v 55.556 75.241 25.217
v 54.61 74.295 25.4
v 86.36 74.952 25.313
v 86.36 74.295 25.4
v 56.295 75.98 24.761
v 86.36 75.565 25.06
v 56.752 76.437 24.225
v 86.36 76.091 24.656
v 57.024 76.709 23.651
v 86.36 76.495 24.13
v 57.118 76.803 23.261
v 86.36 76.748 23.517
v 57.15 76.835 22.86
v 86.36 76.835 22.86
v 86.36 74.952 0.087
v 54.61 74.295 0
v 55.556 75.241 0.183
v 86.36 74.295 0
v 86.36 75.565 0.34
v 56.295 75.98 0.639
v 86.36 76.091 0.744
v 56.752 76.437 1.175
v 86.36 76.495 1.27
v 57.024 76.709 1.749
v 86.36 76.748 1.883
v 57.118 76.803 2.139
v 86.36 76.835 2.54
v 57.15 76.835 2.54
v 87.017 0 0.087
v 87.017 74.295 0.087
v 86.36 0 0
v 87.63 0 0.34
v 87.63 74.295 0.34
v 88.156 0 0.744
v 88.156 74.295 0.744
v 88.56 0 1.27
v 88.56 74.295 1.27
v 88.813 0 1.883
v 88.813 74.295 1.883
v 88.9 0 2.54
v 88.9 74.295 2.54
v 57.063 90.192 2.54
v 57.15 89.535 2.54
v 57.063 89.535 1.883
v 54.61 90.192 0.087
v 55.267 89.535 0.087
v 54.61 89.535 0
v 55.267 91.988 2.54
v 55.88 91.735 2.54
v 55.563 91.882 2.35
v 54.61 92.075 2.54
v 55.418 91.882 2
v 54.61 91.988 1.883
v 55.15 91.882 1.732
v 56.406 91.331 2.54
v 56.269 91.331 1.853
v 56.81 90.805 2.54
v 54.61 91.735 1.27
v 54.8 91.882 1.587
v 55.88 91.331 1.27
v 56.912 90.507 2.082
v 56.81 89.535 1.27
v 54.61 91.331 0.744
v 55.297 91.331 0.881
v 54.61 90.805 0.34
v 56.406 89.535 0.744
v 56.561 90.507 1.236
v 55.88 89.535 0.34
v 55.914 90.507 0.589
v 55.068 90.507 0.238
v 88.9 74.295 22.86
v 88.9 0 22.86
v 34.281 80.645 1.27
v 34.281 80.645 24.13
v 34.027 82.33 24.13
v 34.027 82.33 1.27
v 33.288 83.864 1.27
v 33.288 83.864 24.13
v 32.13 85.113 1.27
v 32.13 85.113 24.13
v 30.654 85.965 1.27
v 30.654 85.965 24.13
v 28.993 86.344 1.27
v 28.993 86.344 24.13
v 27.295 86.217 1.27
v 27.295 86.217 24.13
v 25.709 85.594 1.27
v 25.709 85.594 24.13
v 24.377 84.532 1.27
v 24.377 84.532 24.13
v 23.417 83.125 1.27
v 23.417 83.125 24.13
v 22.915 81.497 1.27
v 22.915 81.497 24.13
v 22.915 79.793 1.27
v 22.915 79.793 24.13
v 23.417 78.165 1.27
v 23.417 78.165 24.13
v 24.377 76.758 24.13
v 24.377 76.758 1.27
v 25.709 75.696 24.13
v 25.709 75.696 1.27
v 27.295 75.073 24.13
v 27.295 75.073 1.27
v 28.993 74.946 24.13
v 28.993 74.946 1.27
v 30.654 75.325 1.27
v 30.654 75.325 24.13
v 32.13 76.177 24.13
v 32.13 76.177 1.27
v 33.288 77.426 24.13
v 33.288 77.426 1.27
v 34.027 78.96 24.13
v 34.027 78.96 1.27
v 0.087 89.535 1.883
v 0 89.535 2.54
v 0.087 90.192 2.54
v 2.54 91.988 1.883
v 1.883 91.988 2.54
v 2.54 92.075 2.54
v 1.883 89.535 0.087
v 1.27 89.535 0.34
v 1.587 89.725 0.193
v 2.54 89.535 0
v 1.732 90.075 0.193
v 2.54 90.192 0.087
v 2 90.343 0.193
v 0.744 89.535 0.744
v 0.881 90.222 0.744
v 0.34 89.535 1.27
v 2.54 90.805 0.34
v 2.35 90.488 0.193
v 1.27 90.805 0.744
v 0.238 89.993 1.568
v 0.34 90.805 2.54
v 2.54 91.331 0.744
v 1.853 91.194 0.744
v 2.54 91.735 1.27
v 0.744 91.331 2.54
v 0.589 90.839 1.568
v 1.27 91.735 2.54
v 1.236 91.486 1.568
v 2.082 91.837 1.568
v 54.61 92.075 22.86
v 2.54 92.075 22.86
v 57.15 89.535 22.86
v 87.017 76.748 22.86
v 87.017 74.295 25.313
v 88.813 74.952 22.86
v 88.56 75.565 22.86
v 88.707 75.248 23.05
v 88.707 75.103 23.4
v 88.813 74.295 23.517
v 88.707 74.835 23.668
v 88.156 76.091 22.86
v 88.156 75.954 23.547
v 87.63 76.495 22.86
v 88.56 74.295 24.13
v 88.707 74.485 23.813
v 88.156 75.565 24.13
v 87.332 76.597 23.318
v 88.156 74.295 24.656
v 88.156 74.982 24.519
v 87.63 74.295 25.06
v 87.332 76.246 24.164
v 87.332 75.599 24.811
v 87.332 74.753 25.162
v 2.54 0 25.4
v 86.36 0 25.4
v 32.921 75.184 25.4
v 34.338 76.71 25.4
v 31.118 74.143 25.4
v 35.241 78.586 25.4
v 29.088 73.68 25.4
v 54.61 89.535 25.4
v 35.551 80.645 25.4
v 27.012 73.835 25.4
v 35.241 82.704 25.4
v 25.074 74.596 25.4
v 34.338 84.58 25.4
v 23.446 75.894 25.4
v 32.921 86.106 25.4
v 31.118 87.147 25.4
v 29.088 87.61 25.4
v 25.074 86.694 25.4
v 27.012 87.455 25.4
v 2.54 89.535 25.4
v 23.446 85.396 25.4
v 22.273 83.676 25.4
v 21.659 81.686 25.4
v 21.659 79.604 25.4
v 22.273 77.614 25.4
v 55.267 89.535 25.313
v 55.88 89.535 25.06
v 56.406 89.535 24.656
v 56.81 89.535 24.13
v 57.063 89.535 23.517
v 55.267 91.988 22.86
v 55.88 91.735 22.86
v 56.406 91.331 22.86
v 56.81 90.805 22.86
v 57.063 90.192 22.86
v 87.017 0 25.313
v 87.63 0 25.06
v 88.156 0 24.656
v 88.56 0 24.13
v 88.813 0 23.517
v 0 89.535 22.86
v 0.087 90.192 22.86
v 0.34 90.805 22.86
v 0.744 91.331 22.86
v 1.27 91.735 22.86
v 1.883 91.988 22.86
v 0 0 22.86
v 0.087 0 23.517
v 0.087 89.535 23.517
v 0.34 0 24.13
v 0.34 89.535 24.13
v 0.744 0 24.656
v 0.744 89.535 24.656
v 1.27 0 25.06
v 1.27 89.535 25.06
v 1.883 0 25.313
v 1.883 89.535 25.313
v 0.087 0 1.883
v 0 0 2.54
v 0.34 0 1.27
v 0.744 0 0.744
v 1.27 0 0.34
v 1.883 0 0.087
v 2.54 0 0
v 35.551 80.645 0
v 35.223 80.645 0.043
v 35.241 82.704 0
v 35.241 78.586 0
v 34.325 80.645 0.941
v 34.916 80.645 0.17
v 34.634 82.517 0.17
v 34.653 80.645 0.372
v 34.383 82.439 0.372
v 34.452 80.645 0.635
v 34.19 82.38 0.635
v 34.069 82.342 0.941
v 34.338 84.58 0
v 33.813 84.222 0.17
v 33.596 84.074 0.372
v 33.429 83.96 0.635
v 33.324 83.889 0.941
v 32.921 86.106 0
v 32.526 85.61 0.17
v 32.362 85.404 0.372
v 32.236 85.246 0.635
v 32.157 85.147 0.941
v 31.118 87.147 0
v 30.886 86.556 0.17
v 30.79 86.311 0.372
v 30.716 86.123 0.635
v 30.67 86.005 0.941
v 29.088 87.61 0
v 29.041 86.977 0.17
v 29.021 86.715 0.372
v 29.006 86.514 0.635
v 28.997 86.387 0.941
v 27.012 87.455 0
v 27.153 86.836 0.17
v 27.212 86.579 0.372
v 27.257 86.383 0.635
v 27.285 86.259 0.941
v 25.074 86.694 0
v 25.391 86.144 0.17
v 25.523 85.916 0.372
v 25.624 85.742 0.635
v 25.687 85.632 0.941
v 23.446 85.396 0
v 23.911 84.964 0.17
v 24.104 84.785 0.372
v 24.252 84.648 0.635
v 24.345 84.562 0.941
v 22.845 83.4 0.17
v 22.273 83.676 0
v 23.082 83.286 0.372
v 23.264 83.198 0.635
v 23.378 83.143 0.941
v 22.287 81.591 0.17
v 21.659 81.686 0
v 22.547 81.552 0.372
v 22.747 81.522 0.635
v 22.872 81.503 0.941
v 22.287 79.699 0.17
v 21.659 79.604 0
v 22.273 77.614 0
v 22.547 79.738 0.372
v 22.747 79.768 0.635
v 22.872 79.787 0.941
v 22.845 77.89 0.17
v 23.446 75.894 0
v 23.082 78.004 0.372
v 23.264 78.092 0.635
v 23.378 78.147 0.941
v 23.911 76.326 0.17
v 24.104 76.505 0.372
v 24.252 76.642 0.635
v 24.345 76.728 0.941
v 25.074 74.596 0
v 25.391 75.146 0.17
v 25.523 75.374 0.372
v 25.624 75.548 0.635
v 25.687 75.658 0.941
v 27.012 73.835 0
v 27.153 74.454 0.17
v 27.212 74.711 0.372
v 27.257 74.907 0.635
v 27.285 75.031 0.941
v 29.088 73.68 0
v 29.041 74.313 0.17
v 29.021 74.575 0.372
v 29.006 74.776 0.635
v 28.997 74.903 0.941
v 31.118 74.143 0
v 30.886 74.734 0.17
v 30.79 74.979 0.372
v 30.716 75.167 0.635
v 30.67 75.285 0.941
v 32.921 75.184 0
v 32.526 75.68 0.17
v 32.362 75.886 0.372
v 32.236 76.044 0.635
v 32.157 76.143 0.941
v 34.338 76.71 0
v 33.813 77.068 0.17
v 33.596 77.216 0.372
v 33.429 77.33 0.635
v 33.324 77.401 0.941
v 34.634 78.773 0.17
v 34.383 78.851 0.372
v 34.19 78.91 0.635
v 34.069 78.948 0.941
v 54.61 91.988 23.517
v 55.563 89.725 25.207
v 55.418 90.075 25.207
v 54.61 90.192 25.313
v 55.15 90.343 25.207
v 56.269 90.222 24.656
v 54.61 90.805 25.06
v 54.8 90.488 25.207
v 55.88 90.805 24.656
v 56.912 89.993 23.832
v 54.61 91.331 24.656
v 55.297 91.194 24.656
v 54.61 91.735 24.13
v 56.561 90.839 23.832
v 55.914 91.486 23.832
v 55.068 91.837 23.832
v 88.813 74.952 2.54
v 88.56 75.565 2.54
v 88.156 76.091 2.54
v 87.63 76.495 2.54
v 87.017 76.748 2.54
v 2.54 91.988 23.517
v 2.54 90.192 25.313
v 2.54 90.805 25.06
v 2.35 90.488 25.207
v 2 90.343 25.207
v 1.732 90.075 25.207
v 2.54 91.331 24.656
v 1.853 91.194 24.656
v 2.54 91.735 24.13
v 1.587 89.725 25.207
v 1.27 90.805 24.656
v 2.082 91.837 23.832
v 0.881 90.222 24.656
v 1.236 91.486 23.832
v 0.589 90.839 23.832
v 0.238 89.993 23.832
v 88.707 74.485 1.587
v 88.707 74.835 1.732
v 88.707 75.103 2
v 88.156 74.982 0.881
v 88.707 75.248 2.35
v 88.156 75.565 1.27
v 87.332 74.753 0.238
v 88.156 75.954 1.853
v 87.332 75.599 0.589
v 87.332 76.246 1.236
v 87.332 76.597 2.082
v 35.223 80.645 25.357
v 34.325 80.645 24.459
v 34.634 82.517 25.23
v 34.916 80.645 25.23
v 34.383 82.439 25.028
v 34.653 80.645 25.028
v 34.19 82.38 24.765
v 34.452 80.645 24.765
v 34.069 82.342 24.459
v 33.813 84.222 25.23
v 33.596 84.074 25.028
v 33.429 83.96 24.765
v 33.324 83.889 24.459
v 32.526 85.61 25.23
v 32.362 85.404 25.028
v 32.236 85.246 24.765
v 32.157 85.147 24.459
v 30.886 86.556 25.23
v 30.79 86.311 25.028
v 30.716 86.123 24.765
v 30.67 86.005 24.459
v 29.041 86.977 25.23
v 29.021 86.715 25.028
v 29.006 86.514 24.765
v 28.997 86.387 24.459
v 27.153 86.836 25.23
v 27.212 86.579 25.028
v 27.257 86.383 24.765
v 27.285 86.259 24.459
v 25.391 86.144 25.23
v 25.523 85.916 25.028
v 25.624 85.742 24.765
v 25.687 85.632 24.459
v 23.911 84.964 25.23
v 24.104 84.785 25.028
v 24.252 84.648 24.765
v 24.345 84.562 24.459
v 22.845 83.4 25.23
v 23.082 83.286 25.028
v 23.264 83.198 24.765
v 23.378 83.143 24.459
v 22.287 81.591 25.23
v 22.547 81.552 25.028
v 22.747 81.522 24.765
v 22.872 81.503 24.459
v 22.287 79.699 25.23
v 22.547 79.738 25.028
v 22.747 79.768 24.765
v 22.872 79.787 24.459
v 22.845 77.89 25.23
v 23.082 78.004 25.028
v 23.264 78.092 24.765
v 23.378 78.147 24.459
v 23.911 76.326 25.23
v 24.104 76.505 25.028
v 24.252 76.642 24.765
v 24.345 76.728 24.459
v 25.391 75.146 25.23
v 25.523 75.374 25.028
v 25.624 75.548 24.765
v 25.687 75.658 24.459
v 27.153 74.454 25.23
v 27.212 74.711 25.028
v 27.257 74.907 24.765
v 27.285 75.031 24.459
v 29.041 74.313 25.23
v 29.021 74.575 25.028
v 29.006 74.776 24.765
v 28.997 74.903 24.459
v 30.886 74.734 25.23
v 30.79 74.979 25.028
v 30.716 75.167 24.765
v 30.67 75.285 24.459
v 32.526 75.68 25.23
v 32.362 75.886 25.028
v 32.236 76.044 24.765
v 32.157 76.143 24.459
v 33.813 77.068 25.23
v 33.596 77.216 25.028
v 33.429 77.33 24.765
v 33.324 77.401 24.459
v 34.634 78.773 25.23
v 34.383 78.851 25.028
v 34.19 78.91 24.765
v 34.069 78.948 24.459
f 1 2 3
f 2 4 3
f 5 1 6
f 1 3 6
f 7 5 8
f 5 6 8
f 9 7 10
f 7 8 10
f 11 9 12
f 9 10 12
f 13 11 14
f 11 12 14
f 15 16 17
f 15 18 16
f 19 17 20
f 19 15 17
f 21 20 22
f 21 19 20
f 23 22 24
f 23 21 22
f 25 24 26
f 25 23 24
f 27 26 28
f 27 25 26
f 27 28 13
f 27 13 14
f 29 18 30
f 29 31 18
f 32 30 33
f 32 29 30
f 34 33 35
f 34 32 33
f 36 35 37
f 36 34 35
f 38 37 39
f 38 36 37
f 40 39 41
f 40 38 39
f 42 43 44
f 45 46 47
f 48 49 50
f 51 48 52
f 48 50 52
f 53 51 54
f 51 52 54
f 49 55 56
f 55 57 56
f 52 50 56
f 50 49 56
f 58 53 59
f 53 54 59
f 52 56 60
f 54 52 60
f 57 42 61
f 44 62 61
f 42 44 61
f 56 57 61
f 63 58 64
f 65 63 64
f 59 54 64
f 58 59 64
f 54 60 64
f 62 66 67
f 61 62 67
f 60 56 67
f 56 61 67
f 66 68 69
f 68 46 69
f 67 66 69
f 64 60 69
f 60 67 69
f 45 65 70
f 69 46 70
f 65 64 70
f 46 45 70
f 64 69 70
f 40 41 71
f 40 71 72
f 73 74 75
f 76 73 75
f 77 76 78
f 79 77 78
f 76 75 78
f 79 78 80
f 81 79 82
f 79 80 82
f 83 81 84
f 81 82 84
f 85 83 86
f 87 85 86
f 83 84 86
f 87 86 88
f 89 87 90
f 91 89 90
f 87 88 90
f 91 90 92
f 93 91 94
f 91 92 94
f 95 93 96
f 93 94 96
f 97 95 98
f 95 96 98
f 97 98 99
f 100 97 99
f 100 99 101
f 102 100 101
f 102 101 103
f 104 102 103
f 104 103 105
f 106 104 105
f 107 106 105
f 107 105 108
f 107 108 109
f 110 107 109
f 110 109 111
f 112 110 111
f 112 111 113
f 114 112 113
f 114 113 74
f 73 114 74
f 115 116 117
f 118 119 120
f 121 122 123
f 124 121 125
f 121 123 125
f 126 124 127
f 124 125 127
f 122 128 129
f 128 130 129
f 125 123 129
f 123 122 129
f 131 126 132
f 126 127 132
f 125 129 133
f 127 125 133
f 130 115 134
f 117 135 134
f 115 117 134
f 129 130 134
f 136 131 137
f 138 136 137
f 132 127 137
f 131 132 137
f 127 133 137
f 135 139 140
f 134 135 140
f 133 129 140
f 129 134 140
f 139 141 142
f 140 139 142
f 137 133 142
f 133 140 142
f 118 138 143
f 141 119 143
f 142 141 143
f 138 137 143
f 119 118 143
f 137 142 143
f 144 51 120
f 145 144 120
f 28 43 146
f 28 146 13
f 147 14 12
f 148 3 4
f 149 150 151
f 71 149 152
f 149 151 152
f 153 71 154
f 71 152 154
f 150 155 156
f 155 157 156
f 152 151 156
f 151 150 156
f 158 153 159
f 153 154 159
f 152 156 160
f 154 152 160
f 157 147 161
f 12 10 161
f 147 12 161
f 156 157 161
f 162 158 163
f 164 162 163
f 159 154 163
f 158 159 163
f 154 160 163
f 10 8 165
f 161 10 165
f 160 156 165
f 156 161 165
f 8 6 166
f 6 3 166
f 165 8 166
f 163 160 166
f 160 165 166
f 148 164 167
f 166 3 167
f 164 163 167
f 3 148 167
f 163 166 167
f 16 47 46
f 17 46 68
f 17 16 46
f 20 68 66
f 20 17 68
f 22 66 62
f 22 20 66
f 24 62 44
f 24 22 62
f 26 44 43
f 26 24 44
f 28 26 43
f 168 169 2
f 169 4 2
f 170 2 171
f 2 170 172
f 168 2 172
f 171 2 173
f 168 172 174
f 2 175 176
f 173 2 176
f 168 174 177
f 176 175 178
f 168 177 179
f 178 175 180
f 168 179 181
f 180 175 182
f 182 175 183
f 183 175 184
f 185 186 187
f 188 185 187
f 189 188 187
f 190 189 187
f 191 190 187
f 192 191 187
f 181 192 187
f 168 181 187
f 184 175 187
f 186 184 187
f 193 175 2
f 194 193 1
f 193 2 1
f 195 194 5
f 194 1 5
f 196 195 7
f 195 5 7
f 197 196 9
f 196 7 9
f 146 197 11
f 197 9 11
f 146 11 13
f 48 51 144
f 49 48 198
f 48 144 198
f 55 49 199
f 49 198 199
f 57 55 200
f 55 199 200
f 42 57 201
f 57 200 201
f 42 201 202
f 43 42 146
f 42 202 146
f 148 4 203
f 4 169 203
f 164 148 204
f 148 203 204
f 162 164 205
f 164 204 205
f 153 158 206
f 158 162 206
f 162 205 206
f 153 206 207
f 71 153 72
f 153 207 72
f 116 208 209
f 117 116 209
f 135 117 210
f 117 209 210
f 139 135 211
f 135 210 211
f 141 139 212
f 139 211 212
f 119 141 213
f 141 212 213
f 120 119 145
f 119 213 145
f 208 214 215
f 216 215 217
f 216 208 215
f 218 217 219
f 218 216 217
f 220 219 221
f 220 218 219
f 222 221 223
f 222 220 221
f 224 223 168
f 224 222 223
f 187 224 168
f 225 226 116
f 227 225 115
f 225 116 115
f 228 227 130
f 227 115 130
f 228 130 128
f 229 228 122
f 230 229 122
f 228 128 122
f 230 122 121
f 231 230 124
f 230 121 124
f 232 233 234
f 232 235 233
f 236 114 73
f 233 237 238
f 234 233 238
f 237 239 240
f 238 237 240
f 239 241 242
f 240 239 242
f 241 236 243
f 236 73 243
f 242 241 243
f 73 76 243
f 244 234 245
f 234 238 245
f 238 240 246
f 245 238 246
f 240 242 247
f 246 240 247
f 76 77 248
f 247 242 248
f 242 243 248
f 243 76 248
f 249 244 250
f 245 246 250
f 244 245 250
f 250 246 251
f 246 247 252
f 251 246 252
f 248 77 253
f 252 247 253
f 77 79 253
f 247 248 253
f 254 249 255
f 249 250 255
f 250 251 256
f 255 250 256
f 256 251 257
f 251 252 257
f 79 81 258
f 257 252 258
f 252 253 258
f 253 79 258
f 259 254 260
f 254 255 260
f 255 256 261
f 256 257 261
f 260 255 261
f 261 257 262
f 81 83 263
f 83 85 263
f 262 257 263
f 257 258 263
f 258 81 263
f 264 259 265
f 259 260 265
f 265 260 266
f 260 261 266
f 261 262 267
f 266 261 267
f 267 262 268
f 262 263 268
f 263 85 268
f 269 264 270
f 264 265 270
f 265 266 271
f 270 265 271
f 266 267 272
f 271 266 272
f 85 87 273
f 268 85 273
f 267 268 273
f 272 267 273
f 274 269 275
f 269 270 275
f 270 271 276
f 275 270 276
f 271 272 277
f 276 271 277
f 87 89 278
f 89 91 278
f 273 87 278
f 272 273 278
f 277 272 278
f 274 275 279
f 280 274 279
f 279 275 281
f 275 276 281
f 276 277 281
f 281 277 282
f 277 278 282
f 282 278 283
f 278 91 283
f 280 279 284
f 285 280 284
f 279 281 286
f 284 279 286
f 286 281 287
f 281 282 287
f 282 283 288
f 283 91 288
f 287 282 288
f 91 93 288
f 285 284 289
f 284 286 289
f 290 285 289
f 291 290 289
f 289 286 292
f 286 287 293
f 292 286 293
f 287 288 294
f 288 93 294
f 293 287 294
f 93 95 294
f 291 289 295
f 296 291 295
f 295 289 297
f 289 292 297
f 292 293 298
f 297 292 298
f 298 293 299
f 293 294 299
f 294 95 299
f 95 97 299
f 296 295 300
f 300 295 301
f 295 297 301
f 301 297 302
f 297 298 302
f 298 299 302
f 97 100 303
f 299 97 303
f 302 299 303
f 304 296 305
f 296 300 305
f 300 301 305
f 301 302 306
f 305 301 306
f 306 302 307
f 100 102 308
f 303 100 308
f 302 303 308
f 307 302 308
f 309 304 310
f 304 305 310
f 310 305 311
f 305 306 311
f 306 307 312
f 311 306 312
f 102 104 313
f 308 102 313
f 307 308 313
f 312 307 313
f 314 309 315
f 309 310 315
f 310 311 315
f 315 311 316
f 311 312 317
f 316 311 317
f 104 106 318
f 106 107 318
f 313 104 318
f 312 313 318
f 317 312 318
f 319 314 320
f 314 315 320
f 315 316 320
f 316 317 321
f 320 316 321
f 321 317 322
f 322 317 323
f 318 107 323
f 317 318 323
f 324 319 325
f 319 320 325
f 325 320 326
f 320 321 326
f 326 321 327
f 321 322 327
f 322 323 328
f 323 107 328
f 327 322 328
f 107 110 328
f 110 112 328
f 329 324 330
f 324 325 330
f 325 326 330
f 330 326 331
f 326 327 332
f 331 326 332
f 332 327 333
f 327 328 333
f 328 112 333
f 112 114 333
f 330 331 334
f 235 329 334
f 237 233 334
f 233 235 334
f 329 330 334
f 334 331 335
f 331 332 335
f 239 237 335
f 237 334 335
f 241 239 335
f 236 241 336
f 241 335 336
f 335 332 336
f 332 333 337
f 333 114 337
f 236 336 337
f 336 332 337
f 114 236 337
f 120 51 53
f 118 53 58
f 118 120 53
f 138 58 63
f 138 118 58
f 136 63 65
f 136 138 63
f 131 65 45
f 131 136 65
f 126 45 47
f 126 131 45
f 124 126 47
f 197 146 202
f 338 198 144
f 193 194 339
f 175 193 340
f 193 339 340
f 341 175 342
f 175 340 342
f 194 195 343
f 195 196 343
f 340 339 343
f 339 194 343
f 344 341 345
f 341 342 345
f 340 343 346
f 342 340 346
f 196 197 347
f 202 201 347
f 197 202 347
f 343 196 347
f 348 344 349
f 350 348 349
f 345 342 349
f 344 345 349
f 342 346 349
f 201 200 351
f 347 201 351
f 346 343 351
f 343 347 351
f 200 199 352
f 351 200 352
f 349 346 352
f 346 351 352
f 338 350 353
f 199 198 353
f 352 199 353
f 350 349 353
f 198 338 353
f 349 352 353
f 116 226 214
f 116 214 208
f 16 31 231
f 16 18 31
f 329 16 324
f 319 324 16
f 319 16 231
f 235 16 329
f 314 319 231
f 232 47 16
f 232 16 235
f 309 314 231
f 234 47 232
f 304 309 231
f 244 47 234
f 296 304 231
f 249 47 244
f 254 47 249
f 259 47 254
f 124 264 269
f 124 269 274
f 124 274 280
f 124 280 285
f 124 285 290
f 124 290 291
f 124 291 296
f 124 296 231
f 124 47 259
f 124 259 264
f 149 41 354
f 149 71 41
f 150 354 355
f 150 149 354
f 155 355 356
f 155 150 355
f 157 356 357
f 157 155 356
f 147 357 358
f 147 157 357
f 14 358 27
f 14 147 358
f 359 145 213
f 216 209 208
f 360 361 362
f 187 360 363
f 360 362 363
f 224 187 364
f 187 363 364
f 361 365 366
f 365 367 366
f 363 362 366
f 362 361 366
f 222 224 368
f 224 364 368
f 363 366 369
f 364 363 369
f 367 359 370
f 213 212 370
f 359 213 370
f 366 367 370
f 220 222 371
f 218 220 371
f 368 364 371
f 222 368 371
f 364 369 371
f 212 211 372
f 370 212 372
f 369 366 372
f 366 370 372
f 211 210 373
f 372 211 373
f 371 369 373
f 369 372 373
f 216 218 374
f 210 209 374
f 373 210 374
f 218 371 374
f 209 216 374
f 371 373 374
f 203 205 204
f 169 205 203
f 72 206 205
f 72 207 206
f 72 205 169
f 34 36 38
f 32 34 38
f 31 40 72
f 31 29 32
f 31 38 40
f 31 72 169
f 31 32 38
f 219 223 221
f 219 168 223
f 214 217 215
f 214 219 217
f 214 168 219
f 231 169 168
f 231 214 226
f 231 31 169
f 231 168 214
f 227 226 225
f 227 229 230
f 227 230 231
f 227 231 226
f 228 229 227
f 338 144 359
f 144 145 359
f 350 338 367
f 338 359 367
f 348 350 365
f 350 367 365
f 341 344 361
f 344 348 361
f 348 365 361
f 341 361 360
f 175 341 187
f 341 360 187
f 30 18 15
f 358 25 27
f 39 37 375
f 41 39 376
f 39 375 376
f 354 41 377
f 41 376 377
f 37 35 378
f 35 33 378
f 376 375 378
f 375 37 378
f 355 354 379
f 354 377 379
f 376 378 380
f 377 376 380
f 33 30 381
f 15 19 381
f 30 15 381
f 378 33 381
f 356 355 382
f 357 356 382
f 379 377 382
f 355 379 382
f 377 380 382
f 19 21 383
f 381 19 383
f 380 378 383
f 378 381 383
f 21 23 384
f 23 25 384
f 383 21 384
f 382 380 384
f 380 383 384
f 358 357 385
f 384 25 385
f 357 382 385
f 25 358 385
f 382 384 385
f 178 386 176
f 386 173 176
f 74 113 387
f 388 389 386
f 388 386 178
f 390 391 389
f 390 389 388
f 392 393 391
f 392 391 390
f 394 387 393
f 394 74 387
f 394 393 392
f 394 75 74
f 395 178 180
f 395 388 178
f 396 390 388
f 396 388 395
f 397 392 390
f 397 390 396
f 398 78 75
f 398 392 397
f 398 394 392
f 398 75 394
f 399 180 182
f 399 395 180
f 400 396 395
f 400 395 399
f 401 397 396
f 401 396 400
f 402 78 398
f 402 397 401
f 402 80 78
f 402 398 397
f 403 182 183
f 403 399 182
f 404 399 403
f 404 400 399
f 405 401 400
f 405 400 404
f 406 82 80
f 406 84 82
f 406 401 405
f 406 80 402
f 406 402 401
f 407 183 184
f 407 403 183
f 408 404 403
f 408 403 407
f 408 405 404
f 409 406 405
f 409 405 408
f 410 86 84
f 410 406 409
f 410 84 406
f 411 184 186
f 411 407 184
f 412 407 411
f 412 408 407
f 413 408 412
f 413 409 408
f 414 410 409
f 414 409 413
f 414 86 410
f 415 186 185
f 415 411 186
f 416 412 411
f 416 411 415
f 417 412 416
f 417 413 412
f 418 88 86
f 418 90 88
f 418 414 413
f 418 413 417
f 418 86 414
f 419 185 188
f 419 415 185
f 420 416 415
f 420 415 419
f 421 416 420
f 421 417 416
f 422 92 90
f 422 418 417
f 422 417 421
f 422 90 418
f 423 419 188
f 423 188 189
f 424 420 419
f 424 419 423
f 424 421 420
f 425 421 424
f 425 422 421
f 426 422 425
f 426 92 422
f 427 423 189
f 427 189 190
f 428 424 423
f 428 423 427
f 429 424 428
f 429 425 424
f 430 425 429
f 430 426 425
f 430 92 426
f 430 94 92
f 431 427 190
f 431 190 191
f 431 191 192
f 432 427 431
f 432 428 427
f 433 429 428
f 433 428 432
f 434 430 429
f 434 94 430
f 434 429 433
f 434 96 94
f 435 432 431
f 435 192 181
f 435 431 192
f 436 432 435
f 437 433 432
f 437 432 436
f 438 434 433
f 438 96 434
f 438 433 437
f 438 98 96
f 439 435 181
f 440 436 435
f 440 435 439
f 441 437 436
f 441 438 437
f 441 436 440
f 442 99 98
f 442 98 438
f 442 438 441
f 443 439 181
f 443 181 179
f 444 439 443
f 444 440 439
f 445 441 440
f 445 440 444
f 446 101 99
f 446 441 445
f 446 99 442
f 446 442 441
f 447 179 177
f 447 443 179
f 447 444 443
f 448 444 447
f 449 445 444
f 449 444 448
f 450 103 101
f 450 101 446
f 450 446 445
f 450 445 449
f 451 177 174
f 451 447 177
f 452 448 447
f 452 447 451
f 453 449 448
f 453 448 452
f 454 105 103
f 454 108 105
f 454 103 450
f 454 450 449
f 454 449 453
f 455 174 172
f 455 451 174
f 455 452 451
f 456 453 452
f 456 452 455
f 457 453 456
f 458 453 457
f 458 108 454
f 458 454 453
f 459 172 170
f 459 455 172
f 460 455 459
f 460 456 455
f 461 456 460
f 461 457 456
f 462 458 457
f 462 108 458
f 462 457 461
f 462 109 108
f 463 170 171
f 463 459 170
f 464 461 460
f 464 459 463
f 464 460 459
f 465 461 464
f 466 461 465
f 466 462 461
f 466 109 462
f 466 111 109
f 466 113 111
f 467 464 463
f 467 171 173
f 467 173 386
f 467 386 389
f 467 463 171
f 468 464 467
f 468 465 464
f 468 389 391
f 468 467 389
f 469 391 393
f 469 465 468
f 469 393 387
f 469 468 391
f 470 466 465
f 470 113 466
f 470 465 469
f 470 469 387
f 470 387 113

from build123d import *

# Parameters (mm, degrees)
BOSS_EXTRUDE1_DEPTH = 25.4
SKETCH9_R           = 5.715
CUT_EXTRUDE1_DEPTH  = 26.4
FILLET9_R           = 2.54
FILLET10_R          = 1.27


with BuildPart() as part:
    # Sketch2 → Boss-Extrude1 (new body)
    with BuildSketch(Plane.XY):
        Polygon((0, 0), (0, 92.075), (18.075, 92.075), (38.575, 92.075), (57.15, 92.075), (57.15, 76.835), (88.9, 76.835), (88.9, 0), align=None)
    extrude(amount=BOSS_EXTRUDE1_DEPTH)

    # Sketch9 → Cut-Extrude1 (cut, through all)
    with BuildSketch(Plane.XY.offset(25.4)):
        with Locations((28.566361876, 80.645)):
            Circle(SKETCH9_R)
    extrude(amount=-CUT_EXTRUDE1_DEPTH, mode=Mode.SUBTRACT)

    # Fillet9
    fillet9_edges = [part.edges().sort_by_distance(p)[0] for p in [
        (57.15, 84.455, 0),
        (73.025, 76.835, 0),
        (88.9, 38.4175, 0),
        (73.025, 76.835, 25.4),
        (0, 92.075, 12.7),
        (57.15, 92.075, 12.7),
        (88.9, 76.835, 12.7),
        (57.15, 84.455, 25.4),
        (28.575, 92.075, 25.4),
        (0, 46.0375, 25.4),
        (0, 46.0375, 0),
        (88.9, 38.4175, 25.4),
        (28.575, 92.075, 0),
    ]]
    fillet(fillet9_edges, radius=FILLET9_R)

    # Fillet10
    fillet10_edges = [part.edges().sort_by_distance(p)[0] for p in [
        (22.851361876, 80.645, 0),
        (22.851361876, 80.645, 25.4),
    ]]
    fillet(fillet10_edges, radius=FILLET10_R)


solid = part.part
